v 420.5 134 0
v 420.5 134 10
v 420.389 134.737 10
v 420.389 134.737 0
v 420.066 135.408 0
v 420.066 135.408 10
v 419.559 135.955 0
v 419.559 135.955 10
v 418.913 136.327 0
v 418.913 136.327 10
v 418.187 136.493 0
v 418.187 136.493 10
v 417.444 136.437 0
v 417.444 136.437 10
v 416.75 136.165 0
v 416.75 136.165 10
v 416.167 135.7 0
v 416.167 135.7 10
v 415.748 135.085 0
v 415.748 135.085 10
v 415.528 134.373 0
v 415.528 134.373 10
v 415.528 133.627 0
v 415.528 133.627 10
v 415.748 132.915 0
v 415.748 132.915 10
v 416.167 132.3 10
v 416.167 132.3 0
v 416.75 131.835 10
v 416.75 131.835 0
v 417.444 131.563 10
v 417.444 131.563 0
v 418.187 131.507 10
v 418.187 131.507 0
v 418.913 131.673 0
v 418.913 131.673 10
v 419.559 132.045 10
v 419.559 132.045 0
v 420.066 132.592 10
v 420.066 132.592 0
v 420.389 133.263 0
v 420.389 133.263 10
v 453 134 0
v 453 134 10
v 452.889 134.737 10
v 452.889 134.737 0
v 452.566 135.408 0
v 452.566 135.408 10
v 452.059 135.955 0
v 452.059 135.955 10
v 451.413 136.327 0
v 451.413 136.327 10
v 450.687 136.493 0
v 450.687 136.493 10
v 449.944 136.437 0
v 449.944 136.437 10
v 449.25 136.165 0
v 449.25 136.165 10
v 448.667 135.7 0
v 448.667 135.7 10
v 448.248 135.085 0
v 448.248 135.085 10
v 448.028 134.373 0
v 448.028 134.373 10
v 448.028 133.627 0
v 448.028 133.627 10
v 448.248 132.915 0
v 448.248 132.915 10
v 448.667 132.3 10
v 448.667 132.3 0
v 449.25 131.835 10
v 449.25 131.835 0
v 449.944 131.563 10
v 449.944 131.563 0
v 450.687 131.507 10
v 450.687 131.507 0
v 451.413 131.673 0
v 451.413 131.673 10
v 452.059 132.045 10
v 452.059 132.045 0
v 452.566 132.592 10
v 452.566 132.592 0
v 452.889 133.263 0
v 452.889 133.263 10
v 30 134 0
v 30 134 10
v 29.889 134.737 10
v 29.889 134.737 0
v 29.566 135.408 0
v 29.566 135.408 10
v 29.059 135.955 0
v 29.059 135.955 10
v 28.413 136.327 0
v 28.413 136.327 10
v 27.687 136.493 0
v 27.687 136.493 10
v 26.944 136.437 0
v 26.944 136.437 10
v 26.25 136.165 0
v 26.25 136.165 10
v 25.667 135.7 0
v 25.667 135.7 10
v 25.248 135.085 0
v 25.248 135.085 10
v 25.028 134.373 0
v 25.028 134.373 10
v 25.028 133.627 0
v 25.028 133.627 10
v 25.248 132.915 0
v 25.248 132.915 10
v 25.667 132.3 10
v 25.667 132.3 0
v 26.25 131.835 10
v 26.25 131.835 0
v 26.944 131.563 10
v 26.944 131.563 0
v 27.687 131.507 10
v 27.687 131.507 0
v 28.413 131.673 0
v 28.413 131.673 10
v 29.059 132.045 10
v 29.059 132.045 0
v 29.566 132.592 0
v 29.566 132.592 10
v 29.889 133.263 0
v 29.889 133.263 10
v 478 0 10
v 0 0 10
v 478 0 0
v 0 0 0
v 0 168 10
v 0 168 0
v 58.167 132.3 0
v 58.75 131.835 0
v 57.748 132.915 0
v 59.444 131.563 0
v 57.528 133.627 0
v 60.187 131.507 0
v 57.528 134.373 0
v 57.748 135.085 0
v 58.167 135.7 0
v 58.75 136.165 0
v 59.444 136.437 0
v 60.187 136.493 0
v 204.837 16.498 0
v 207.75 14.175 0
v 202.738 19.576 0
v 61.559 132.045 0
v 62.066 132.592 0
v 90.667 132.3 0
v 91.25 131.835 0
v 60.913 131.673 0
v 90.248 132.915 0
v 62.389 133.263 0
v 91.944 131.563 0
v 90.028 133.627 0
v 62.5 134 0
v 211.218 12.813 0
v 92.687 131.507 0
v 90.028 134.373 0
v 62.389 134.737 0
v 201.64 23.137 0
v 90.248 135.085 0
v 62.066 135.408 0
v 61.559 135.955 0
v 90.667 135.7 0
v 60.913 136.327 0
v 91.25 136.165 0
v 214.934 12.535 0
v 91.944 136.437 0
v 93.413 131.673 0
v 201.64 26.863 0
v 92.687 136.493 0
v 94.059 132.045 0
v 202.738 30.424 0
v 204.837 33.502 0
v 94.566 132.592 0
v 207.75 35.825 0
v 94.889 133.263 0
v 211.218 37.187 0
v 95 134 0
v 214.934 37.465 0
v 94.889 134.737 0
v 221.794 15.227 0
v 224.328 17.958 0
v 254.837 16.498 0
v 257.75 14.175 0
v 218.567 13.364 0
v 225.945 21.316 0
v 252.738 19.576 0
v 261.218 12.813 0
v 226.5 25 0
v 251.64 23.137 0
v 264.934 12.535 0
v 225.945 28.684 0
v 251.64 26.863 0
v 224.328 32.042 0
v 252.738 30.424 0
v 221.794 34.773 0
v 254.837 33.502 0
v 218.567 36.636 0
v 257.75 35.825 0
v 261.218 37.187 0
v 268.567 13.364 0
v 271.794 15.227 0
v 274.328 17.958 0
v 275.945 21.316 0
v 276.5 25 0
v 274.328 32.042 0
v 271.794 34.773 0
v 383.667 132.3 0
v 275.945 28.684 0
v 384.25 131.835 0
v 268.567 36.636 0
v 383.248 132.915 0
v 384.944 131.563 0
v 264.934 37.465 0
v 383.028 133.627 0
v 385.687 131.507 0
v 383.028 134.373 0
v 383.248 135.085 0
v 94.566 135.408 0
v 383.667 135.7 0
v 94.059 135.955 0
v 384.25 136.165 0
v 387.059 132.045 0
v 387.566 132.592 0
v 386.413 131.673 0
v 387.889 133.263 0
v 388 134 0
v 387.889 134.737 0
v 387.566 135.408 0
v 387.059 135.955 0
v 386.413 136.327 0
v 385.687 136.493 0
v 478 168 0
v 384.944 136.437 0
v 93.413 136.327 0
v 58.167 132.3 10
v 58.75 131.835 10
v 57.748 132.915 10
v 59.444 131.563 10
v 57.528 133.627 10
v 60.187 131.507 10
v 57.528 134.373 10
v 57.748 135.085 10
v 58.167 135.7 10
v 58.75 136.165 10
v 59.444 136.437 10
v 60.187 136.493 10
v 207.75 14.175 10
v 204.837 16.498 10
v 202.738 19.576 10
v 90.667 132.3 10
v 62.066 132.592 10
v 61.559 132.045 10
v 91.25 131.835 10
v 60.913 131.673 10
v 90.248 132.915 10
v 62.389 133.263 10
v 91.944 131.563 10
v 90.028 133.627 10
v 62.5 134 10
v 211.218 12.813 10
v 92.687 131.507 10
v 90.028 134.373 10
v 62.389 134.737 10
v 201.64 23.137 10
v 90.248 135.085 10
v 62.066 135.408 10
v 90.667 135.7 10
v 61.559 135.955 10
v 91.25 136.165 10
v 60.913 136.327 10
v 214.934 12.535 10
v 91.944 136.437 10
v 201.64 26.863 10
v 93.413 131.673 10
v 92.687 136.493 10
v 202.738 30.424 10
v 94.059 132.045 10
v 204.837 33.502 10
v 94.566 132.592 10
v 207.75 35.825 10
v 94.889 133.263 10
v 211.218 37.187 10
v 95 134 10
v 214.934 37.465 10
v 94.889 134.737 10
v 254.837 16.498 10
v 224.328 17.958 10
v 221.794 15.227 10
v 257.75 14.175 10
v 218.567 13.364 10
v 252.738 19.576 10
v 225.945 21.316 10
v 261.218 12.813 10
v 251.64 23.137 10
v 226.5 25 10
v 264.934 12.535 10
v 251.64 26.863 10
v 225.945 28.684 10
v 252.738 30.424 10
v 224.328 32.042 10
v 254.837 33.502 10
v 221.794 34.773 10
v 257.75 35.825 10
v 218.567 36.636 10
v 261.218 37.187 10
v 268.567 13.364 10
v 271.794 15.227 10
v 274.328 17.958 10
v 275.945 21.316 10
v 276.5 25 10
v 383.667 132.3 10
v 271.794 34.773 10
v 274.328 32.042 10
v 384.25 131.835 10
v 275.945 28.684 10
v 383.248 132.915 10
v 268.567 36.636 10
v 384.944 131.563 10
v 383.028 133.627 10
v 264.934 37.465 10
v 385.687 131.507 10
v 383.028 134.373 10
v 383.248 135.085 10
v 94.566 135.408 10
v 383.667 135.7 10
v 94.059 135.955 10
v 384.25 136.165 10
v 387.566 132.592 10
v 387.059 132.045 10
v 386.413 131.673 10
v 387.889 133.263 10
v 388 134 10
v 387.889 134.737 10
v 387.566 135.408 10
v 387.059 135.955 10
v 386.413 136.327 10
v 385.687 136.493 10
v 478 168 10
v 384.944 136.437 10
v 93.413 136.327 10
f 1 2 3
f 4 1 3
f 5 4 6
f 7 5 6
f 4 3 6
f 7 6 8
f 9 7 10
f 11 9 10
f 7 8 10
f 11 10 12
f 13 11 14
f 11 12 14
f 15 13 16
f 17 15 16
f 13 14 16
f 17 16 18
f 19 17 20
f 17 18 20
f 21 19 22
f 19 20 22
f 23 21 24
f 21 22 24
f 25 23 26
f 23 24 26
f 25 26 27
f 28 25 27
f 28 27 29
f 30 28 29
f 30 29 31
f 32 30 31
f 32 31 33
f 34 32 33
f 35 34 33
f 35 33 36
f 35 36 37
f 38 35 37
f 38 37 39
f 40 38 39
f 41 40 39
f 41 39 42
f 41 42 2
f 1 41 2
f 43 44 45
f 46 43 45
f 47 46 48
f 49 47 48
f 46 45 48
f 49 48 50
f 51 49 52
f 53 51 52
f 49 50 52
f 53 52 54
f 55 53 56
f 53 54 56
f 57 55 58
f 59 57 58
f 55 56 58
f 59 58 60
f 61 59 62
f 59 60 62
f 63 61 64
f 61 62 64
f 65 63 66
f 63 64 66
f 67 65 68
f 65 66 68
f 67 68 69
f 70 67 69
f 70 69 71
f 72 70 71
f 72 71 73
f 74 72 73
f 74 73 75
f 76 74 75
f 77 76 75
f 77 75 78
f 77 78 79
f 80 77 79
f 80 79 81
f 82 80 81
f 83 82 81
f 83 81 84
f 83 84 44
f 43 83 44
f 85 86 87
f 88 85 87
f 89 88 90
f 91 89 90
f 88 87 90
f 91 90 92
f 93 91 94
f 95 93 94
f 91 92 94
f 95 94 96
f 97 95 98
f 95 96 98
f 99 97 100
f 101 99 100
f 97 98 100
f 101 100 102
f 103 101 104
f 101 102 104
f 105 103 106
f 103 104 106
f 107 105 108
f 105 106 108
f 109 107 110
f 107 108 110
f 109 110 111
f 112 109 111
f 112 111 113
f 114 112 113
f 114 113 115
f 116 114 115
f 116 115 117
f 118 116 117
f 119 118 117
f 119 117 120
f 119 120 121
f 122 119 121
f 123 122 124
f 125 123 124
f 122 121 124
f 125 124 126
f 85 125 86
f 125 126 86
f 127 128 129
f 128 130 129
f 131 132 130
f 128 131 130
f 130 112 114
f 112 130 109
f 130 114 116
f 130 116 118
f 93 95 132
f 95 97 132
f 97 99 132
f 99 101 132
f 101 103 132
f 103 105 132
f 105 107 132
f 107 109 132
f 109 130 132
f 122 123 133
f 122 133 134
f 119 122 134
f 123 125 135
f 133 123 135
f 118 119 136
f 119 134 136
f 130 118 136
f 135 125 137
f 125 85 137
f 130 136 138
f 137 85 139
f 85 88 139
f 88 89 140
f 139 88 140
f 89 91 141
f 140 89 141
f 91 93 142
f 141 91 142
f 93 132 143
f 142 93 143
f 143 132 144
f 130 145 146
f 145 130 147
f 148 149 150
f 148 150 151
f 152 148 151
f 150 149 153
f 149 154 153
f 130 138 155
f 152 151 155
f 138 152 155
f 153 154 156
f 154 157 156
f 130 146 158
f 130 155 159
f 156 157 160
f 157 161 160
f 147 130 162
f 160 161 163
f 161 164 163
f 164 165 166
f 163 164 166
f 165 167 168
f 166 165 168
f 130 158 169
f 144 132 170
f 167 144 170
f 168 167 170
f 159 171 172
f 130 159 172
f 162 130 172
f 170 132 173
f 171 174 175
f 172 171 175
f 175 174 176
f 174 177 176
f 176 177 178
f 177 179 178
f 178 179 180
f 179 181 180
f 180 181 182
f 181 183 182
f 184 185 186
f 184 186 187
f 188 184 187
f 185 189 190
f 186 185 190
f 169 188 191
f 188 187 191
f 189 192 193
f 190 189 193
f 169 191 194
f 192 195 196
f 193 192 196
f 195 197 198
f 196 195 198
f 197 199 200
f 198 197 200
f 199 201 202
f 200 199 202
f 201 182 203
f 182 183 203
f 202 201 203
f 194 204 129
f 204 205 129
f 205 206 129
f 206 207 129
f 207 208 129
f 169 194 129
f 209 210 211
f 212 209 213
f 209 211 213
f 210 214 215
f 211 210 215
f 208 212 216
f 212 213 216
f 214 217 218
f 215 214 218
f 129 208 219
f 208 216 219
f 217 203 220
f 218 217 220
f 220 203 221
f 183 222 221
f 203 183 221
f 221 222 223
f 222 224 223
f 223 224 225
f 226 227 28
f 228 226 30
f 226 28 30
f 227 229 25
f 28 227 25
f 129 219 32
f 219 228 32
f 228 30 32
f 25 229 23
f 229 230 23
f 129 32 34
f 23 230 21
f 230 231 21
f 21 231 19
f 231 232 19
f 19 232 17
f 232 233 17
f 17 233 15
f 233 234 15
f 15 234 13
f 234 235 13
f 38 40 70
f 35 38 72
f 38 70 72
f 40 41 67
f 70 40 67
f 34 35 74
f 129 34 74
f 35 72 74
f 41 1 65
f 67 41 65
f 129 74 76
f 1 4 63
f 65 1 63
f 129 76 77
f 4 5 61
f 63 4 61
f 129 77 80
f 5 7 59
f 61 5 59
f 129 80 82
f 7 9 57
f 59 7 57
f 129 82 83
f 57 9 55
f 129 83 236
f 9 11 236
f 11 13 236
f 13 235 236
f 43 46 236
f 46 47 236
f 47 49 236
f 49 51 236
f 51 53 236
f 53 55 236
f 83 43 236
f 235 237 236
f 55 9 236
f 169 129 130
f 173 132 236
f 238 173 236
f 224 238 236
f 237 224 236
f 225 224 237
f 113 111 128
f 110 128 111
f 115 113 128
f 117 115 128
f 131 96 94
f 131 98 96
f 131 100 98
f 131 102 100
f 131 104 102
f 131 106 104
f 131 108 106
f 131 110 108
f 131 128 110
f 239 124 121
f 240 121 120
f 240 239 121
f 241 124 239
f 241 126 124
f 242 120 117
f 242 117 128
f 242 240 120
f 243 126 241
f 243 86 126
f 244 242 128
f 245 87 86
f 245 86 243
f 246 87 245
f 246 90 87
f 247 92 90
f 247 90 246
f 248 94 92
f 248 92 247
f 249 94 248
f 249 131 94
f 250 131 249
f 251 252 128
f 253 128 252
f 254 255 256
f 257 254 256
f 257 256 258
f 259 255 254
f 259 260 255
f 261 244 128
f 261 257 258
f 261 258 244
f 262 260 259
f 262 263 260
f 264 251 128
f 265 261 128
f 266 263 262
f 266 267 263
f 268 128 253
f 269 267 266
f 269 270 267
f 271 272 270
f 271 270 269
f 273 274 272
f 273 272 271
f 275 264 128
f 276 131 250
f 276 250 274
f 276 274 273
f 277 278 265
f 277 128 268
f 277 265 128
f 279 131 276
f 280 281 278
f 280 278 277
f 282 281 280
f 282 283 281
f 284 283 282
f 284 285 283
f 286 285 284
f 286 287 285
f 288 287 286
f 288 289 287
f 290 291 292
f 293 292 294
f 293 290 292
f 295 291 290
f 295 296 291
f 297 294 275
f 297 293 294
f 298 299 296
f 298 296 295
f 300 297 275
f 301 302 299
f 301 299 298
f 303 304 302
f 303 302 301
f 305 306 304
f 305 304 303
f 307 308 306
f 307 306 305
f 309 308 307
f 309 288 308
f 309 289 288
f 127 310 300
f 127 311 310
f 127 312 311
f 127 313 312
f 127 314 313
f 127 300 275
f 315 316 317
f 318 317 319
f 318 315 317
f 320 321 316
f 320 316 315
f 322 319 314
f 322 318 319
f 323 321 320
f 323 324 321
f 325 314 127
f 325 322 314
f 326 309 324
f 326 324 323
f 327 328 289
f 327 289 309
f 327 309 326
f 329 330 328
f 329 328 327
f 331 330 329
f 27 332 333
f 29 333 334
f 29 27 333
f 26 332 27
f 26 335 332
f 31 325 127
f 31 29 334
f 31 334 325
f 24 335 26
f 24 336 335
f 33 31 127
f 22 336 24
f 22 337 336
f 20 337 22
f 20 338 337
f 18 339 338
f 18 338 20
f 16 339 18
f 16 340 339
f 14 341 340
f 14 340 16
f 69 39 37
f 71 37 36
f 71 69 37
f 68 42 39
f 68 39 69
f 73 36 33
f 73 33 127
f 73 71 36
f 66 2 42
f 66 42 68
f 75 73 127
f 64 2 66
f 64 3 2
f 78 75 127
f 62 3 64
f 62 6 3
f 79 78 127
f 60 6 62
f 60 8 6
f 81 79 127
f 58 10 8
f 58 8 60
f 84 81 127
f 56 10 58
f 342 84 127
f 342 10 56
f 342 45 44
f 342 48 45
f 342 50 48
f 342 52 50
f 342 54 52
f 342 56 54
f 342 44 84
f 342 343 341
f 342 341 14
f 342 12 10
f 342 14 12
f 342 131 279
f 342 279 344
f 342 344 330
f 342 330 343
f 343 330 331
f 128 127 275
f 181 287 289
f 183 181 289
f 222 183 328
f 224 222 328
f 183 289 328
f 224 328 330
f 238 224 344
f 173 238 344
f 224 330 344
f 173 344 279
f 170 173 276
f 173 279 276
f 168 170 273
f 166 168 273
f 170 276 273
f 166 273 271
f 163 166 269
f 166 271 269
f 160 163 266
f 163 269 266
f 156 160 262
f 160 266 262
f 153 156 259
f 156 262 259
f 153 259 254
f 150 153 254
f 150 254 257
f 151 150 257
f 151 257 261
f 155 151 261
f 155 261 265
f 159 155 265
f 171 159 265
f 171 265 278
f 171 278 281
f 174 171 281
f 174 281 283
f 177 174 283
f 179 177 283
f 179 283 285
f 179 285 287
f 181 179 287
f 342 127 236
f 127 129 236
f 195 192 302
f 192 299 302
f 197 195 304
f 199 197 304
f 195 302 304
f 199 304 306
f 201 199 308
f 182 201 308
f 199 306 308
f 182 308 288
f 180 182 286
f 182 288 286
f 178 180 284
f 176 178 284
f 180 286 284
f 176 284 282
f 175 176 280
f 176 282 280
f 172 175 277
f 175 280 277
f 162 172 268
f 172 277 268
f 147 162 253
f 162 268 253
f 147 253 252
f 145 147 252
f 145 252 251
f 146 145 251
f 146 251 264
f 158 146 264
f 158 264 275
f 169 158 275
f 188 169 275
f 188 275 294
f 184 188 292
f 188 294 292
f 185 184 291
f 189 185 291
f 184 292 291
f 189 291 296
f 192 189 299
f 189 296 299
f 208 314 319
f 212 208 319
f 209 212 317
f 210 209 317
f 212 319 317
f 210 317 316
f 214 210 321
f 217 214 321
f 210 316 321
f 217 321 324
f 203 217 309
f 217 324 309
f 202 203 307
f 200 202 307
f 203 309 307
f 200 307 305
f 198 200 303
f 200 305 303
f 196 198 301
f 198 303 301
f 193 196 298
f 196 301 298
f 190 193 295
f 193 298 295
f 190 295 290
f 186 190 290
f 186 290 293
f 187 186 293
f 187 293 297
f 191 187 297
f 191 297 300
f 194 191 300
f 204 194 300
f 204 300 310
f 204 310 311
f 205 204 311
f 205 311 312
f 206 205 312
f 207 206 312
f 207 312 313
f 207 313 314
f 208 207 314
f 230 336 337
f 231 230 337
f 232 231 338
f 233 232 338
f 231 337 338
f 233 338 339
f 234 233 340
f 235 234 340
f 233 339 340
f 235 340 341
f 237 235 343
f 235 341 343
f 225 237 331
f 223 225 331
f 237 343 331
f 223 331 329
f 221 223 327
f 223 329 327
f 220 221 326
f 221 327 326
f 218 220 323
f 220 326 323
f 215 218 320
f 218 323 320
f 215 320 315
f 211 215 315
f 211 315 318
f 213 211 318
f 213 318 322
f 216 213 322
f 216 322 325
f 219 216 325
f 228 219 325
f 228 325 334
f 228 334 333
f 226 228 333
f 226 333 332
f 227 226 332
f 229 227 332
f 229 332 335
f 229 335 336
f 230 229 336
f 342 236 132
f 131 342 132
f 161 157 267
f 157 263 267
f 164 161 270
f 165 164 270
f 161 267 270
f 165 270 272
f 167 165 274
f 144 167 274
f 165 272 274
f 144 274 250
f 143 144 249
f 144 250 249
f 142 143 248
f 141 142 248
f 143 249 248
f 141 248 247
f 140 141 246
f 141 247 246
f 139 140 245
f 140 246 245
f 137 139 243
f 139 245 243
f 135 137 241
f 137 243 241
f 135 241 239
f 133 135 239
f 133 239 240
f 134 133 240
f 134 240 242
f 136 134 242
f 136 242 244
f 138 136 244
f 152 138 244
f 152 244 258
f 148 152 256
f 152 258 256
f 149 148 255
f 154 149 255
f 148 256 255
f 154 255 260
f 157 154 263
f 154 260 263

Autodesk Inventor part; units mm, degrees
ref_plane "YZ Plane" through (0, 0, 0) normal (1, 0, 0) x (0, 1, 0)
ref_plane "XZ Plane" through (0, 0, 0) normal (0, 1, 0) x (-1, 0, 0)
ref_plane "XY Plane" through (0, 0, 0) normal (0, 0, 1) x (1, 0, 0)
sketch "Sketch1" plane through (0, 0, 0) normal (0, 0, 1) x (1, 0, 0)
  line L0 (0, 0) -> (478, 0)
  line L1 (478, 0) -> (478, 168)
  line L2 (478, 168) -> (0, 168)
  line L3 (0, 168) -> (0, 0)
  dimension "d0" = 478
  dimension "d1" = 168
extrude "Extrusion1" add sketch "Sketch1" along normal blind 10
sketch "Sketch2" plane through (0, 0, 10) normal (0, 0, 1) x (1, 0, 0)
  circle A0 centre (27.5, 134) radius 2.5
  circle A1 centre (92.5, 134) radius 2.5
  line L0 (478, 168) -> (0, 168) projected
  line L1 (0, 168) -> (0, 0) projected
  circle A2 centre (385.5, 134) radius 2.5
  circle A3 centre (450.5, 134) radius 2.5
  line L2 (478, 0) -> (478, 168) projected
  line L3 (27.5, 134) -> (92.5, 134) construction
  line L4 (385.5, 134) -> (450.5, 134) construction
  circle A4 centre (60, 134) radius 2.5
  circle A5 centre (418, 134) radius 2.5
  dimension "d5" = 5
  dimension "d6" = 5
  dimension "d7" = 65
  dimension "d8" = 34
  dimension "d9" = 27.5
  dimension "d10" = 5
  dimension "d11" = 5
  dimension "d12" = 65
  dimension "d13" = 27.5
  dimension "d28" = 5
  dimension "d29" = 5
extrude "Extrusion2" cut sketch "Sketch2" against normal through all
sketch "Sketch3" plane through (0, 0, 10) normal (0, 0, 1) x (1, 0, 0)
  line L0 (189, 85) -> (289, 85)
  line L1 (289, 85) -> (289, 15)
  line L2 (289, 15) -> (189, 15)
  line L3 (189, 15) -> (189, 85)
  line L4 (0, 0) -> (478, 0) projected
  point P0 (239, 15)
  point P1 (239, 0)
  dimension "d16" = 100
  dimension "d17" = 70
  dimension "d18" = 15
extrude "Extrusion3" [suppressed]
sketch "Sketch6" plane through (289, 15, 10) normal (-1, 0, 0) x (0, 0, 1)
  line L0 (0, 70) -> (0, 0) projected
  line L1 (0, 70) -> (-7, 70) projected
  line L2 (-7, 70) -> (-7, 0) construction
  line L3 (0, 0) -> (-7, 0) projected
  line L4 (-7, 70) -> (8, 70) construction
  line L5 (8, 70) -> (8, 25) construction
  line L6 (8, 25) -> (-7, 25) construction
  line L7 (-7, 25) -> (-7, 70)
  line L8 (8, 25) -> (18, 25)
  line L9 (0, -15) -> (0, 153) projected
  arc A0 (18, 25) -> (0, 100) centre (-131.9551, 28.6708) ccw
  line L10 (0, 100) -> (0, 70)
  line L11 (0, 70) -> (8, 70)
  line L12 (8, 70) -> (8, 25)
  point P0 (-10, -15)
  dimension "d33" = 15
  dimension "d34" = 25
  dimension "d35" = 10
  dimension "d36" = 150
  dimension "d37" = 30
extrude "Extrusion6" [suppressed]
sketch "Sketch7" plane through (189, 15, 10) normal (-1, 0, 0) x (0, 0, 1)
  arc A0 (18, 25) -> (0, 100) centre (-131.9551, 28.6708) ccw projected
  line L0 (18, 25) -> (0, 25)
  line L1 (0, 153) -> (0, -15) projected
  line L2 (0, 25) -> (0, 100)
  point P0 (-10, -15)
extrude "Extrusion7" [suppressed]
sketch "Sketch8" plane through (289, 15, 10) normal (1, 0, 0) x (0, 0, -1)
  arc A0 (0, 100) -> (-18, 25) centre (131.9551, 28.6708) ccw projected
  line L0 (0, 25) -> (0, 100) projected
  line L1 (0, 25) -> (-18, 25) projected
  point P0 (10, -15)
extrude "Extrusion8" [suppressed]
sketch "Sketch9" plane through (0, 0, 10) normal (0, 0, 1) x (1, 0, 0)
  line L0 (214, 25) -> (264, 25) construction
  circle A0 centre (264, 25) radius 12.5
  circle A1 centre (214, 25) radius 12.5
  line L1 (0, 0) -> (478, 0) construction
  point P0 (239, 25)
  point P1 (239, 0)
  dimension "d45" = 50
  dimension "d46" = 25
  dimension "d47" = 25
  dimension "d48" = 25
extrude "Extrusion9" cut sketch "Sketch9" against normal through all
properties part number "TC005b" material "ABS Plastic"
